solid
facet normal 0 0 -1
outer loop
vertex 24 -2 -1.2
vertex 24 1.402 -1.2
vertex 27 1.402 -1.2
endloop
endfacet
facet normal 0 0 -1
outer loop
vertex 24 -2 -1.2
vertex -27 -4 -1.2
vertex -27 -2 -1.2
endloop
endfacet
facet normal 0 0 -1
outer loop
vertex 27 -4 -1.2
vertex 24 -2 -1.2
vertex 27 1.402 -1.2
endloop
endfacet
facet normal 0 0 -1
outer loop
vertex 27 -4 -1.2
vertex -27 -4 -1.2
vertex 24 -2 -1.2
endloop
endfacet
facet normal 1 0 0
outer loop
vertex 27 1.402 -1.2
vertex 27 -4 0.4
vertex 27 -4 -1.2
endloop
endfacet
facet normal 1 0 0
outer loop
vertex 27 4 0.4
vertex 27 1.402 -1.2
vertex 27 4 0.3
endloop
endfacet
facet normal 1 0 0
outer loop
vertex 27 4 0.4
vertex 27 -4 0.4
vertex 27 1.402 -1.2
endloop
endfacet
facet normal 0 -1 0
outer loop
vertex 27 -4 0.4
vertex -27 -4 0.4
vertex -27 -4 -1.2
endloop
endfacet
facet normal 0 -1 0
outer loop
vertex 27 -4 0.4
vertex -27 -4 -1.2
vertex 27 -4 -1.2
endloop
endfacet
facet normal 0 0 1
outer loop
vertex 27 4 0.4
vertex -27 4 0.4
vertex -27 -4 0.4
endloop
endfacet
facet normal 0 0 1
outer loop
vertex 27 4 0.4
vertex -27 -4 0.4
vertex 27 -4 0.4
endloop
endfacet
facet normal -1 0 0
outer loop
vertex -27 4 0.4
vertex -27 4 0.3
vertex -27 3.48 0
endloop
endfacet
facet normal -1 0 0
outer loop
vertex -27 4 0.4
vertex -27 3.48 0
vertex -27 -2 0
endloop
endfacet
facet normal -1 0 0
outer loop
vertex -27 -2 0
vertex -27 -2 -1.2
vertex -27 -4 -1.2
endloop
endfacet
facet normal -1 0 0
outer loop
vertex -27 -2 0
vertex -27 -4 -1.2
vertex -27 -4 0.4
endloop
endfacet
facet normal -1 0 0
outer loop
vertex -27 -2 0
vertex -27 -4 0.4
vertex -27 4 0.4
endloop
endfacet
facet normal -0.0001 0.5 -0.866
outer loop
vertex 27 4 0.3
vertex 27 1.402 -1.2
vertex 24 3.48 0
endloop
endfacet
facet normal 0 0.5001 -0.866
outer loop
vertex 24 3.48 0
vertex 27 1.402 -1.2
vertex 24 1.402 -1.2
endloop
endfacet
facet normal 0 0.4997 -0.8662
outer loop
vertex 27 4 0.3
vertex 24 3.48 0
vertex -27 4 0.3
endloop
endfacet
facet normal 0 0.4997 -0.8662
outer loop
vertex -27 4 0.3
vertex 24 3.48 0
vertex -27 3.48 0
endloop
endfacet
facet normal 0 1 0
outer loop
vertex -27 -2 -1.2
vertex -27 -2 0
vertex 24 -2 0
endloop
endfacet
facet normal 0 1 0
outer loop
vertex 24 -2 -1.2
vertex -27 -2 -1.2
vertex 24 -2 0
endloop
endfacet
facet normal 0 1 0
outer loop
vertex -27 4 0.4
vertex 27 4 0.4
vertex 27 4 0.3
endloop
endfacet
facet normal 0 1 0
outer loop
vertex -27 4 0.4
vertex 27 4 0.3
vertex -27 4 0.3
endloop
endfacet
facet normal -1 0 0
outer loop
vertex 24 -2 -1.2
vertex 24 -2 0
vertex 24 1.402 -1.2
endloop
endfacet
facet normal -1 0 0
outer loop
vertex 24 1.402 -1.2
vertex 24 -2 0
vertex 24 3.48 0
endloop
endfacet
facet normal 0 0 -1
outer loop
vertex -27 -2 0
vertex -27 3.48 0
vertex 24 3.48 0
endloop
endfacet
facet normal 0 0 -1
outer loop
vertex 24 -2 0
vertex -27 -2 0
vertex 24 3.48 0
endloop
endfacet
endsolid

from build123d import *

# Parameters (mm, degrees)
SKETCH_1_W      = 54
SKETCH_1_H      = 8
EXTRUDE_1_DEPTH = 0.4
SKETCH_2_W      = 3
SKETCH_2_H      = 8
EXTRUDE_2_DEPTH = 1.2
SKETCH_3_W      = 54
SKETCH_3_H      = 1.6
EXTRUDE_3_DEPTH = 2
CHAMFER_1_SIZE  = 1.5
CHAMFER_1_SIZE2 = 2.598076211


with BuildPart() as part:
    # 草图1 → 凸台-拉伸1 (new body)
    with BuildSketch(Plane.XY):
        Rectangle(SKETCH_1_W, SKETCH_1_H)
    extrude(amount=EXTRUDE_1_DEPTH)

    # 草图2 → 凸台-拉伸2 (add)
    with BuildSketch(Plane(origin=(0, 0, 0), x_dir=(-1, 0, 0), z_dir=(0, 0, -1))):
        with Locations((-25.5, 0)):
            Rectangle(SKETCH_2_W, SKETCH_2_H)
    extrude(amount=EXTRUDE_2_DEPTH)

    # 草图3 → 凸台-拉伸3 (add)
    with BuildSketch(Plane.XZ.offset(4)):
        with Locations((0, -0.4)):
            Rectangle(SKETCH_3_W, SKETCH_3_H)
    extrude(amount=-EXTRUDE_3_DEPTH)

    # 倒角1
    chamfer_1_edges = [part.edges().sort_by_distance(p)[0] for p in [
        (25.5, 4, -1.2),
    ]]
    chamfer_1_side = [part.faces().sort_by_distance(p)[0] for p in [
        (3.642857143, 4, 0.085714286),
    ]]
    chamfer(chamfer_1_edges, length=CHAMFER_1_SIZE, length2=CHAMFER_1_SIZE2, reference=chamfer_1_side[0])


solid = part.part
